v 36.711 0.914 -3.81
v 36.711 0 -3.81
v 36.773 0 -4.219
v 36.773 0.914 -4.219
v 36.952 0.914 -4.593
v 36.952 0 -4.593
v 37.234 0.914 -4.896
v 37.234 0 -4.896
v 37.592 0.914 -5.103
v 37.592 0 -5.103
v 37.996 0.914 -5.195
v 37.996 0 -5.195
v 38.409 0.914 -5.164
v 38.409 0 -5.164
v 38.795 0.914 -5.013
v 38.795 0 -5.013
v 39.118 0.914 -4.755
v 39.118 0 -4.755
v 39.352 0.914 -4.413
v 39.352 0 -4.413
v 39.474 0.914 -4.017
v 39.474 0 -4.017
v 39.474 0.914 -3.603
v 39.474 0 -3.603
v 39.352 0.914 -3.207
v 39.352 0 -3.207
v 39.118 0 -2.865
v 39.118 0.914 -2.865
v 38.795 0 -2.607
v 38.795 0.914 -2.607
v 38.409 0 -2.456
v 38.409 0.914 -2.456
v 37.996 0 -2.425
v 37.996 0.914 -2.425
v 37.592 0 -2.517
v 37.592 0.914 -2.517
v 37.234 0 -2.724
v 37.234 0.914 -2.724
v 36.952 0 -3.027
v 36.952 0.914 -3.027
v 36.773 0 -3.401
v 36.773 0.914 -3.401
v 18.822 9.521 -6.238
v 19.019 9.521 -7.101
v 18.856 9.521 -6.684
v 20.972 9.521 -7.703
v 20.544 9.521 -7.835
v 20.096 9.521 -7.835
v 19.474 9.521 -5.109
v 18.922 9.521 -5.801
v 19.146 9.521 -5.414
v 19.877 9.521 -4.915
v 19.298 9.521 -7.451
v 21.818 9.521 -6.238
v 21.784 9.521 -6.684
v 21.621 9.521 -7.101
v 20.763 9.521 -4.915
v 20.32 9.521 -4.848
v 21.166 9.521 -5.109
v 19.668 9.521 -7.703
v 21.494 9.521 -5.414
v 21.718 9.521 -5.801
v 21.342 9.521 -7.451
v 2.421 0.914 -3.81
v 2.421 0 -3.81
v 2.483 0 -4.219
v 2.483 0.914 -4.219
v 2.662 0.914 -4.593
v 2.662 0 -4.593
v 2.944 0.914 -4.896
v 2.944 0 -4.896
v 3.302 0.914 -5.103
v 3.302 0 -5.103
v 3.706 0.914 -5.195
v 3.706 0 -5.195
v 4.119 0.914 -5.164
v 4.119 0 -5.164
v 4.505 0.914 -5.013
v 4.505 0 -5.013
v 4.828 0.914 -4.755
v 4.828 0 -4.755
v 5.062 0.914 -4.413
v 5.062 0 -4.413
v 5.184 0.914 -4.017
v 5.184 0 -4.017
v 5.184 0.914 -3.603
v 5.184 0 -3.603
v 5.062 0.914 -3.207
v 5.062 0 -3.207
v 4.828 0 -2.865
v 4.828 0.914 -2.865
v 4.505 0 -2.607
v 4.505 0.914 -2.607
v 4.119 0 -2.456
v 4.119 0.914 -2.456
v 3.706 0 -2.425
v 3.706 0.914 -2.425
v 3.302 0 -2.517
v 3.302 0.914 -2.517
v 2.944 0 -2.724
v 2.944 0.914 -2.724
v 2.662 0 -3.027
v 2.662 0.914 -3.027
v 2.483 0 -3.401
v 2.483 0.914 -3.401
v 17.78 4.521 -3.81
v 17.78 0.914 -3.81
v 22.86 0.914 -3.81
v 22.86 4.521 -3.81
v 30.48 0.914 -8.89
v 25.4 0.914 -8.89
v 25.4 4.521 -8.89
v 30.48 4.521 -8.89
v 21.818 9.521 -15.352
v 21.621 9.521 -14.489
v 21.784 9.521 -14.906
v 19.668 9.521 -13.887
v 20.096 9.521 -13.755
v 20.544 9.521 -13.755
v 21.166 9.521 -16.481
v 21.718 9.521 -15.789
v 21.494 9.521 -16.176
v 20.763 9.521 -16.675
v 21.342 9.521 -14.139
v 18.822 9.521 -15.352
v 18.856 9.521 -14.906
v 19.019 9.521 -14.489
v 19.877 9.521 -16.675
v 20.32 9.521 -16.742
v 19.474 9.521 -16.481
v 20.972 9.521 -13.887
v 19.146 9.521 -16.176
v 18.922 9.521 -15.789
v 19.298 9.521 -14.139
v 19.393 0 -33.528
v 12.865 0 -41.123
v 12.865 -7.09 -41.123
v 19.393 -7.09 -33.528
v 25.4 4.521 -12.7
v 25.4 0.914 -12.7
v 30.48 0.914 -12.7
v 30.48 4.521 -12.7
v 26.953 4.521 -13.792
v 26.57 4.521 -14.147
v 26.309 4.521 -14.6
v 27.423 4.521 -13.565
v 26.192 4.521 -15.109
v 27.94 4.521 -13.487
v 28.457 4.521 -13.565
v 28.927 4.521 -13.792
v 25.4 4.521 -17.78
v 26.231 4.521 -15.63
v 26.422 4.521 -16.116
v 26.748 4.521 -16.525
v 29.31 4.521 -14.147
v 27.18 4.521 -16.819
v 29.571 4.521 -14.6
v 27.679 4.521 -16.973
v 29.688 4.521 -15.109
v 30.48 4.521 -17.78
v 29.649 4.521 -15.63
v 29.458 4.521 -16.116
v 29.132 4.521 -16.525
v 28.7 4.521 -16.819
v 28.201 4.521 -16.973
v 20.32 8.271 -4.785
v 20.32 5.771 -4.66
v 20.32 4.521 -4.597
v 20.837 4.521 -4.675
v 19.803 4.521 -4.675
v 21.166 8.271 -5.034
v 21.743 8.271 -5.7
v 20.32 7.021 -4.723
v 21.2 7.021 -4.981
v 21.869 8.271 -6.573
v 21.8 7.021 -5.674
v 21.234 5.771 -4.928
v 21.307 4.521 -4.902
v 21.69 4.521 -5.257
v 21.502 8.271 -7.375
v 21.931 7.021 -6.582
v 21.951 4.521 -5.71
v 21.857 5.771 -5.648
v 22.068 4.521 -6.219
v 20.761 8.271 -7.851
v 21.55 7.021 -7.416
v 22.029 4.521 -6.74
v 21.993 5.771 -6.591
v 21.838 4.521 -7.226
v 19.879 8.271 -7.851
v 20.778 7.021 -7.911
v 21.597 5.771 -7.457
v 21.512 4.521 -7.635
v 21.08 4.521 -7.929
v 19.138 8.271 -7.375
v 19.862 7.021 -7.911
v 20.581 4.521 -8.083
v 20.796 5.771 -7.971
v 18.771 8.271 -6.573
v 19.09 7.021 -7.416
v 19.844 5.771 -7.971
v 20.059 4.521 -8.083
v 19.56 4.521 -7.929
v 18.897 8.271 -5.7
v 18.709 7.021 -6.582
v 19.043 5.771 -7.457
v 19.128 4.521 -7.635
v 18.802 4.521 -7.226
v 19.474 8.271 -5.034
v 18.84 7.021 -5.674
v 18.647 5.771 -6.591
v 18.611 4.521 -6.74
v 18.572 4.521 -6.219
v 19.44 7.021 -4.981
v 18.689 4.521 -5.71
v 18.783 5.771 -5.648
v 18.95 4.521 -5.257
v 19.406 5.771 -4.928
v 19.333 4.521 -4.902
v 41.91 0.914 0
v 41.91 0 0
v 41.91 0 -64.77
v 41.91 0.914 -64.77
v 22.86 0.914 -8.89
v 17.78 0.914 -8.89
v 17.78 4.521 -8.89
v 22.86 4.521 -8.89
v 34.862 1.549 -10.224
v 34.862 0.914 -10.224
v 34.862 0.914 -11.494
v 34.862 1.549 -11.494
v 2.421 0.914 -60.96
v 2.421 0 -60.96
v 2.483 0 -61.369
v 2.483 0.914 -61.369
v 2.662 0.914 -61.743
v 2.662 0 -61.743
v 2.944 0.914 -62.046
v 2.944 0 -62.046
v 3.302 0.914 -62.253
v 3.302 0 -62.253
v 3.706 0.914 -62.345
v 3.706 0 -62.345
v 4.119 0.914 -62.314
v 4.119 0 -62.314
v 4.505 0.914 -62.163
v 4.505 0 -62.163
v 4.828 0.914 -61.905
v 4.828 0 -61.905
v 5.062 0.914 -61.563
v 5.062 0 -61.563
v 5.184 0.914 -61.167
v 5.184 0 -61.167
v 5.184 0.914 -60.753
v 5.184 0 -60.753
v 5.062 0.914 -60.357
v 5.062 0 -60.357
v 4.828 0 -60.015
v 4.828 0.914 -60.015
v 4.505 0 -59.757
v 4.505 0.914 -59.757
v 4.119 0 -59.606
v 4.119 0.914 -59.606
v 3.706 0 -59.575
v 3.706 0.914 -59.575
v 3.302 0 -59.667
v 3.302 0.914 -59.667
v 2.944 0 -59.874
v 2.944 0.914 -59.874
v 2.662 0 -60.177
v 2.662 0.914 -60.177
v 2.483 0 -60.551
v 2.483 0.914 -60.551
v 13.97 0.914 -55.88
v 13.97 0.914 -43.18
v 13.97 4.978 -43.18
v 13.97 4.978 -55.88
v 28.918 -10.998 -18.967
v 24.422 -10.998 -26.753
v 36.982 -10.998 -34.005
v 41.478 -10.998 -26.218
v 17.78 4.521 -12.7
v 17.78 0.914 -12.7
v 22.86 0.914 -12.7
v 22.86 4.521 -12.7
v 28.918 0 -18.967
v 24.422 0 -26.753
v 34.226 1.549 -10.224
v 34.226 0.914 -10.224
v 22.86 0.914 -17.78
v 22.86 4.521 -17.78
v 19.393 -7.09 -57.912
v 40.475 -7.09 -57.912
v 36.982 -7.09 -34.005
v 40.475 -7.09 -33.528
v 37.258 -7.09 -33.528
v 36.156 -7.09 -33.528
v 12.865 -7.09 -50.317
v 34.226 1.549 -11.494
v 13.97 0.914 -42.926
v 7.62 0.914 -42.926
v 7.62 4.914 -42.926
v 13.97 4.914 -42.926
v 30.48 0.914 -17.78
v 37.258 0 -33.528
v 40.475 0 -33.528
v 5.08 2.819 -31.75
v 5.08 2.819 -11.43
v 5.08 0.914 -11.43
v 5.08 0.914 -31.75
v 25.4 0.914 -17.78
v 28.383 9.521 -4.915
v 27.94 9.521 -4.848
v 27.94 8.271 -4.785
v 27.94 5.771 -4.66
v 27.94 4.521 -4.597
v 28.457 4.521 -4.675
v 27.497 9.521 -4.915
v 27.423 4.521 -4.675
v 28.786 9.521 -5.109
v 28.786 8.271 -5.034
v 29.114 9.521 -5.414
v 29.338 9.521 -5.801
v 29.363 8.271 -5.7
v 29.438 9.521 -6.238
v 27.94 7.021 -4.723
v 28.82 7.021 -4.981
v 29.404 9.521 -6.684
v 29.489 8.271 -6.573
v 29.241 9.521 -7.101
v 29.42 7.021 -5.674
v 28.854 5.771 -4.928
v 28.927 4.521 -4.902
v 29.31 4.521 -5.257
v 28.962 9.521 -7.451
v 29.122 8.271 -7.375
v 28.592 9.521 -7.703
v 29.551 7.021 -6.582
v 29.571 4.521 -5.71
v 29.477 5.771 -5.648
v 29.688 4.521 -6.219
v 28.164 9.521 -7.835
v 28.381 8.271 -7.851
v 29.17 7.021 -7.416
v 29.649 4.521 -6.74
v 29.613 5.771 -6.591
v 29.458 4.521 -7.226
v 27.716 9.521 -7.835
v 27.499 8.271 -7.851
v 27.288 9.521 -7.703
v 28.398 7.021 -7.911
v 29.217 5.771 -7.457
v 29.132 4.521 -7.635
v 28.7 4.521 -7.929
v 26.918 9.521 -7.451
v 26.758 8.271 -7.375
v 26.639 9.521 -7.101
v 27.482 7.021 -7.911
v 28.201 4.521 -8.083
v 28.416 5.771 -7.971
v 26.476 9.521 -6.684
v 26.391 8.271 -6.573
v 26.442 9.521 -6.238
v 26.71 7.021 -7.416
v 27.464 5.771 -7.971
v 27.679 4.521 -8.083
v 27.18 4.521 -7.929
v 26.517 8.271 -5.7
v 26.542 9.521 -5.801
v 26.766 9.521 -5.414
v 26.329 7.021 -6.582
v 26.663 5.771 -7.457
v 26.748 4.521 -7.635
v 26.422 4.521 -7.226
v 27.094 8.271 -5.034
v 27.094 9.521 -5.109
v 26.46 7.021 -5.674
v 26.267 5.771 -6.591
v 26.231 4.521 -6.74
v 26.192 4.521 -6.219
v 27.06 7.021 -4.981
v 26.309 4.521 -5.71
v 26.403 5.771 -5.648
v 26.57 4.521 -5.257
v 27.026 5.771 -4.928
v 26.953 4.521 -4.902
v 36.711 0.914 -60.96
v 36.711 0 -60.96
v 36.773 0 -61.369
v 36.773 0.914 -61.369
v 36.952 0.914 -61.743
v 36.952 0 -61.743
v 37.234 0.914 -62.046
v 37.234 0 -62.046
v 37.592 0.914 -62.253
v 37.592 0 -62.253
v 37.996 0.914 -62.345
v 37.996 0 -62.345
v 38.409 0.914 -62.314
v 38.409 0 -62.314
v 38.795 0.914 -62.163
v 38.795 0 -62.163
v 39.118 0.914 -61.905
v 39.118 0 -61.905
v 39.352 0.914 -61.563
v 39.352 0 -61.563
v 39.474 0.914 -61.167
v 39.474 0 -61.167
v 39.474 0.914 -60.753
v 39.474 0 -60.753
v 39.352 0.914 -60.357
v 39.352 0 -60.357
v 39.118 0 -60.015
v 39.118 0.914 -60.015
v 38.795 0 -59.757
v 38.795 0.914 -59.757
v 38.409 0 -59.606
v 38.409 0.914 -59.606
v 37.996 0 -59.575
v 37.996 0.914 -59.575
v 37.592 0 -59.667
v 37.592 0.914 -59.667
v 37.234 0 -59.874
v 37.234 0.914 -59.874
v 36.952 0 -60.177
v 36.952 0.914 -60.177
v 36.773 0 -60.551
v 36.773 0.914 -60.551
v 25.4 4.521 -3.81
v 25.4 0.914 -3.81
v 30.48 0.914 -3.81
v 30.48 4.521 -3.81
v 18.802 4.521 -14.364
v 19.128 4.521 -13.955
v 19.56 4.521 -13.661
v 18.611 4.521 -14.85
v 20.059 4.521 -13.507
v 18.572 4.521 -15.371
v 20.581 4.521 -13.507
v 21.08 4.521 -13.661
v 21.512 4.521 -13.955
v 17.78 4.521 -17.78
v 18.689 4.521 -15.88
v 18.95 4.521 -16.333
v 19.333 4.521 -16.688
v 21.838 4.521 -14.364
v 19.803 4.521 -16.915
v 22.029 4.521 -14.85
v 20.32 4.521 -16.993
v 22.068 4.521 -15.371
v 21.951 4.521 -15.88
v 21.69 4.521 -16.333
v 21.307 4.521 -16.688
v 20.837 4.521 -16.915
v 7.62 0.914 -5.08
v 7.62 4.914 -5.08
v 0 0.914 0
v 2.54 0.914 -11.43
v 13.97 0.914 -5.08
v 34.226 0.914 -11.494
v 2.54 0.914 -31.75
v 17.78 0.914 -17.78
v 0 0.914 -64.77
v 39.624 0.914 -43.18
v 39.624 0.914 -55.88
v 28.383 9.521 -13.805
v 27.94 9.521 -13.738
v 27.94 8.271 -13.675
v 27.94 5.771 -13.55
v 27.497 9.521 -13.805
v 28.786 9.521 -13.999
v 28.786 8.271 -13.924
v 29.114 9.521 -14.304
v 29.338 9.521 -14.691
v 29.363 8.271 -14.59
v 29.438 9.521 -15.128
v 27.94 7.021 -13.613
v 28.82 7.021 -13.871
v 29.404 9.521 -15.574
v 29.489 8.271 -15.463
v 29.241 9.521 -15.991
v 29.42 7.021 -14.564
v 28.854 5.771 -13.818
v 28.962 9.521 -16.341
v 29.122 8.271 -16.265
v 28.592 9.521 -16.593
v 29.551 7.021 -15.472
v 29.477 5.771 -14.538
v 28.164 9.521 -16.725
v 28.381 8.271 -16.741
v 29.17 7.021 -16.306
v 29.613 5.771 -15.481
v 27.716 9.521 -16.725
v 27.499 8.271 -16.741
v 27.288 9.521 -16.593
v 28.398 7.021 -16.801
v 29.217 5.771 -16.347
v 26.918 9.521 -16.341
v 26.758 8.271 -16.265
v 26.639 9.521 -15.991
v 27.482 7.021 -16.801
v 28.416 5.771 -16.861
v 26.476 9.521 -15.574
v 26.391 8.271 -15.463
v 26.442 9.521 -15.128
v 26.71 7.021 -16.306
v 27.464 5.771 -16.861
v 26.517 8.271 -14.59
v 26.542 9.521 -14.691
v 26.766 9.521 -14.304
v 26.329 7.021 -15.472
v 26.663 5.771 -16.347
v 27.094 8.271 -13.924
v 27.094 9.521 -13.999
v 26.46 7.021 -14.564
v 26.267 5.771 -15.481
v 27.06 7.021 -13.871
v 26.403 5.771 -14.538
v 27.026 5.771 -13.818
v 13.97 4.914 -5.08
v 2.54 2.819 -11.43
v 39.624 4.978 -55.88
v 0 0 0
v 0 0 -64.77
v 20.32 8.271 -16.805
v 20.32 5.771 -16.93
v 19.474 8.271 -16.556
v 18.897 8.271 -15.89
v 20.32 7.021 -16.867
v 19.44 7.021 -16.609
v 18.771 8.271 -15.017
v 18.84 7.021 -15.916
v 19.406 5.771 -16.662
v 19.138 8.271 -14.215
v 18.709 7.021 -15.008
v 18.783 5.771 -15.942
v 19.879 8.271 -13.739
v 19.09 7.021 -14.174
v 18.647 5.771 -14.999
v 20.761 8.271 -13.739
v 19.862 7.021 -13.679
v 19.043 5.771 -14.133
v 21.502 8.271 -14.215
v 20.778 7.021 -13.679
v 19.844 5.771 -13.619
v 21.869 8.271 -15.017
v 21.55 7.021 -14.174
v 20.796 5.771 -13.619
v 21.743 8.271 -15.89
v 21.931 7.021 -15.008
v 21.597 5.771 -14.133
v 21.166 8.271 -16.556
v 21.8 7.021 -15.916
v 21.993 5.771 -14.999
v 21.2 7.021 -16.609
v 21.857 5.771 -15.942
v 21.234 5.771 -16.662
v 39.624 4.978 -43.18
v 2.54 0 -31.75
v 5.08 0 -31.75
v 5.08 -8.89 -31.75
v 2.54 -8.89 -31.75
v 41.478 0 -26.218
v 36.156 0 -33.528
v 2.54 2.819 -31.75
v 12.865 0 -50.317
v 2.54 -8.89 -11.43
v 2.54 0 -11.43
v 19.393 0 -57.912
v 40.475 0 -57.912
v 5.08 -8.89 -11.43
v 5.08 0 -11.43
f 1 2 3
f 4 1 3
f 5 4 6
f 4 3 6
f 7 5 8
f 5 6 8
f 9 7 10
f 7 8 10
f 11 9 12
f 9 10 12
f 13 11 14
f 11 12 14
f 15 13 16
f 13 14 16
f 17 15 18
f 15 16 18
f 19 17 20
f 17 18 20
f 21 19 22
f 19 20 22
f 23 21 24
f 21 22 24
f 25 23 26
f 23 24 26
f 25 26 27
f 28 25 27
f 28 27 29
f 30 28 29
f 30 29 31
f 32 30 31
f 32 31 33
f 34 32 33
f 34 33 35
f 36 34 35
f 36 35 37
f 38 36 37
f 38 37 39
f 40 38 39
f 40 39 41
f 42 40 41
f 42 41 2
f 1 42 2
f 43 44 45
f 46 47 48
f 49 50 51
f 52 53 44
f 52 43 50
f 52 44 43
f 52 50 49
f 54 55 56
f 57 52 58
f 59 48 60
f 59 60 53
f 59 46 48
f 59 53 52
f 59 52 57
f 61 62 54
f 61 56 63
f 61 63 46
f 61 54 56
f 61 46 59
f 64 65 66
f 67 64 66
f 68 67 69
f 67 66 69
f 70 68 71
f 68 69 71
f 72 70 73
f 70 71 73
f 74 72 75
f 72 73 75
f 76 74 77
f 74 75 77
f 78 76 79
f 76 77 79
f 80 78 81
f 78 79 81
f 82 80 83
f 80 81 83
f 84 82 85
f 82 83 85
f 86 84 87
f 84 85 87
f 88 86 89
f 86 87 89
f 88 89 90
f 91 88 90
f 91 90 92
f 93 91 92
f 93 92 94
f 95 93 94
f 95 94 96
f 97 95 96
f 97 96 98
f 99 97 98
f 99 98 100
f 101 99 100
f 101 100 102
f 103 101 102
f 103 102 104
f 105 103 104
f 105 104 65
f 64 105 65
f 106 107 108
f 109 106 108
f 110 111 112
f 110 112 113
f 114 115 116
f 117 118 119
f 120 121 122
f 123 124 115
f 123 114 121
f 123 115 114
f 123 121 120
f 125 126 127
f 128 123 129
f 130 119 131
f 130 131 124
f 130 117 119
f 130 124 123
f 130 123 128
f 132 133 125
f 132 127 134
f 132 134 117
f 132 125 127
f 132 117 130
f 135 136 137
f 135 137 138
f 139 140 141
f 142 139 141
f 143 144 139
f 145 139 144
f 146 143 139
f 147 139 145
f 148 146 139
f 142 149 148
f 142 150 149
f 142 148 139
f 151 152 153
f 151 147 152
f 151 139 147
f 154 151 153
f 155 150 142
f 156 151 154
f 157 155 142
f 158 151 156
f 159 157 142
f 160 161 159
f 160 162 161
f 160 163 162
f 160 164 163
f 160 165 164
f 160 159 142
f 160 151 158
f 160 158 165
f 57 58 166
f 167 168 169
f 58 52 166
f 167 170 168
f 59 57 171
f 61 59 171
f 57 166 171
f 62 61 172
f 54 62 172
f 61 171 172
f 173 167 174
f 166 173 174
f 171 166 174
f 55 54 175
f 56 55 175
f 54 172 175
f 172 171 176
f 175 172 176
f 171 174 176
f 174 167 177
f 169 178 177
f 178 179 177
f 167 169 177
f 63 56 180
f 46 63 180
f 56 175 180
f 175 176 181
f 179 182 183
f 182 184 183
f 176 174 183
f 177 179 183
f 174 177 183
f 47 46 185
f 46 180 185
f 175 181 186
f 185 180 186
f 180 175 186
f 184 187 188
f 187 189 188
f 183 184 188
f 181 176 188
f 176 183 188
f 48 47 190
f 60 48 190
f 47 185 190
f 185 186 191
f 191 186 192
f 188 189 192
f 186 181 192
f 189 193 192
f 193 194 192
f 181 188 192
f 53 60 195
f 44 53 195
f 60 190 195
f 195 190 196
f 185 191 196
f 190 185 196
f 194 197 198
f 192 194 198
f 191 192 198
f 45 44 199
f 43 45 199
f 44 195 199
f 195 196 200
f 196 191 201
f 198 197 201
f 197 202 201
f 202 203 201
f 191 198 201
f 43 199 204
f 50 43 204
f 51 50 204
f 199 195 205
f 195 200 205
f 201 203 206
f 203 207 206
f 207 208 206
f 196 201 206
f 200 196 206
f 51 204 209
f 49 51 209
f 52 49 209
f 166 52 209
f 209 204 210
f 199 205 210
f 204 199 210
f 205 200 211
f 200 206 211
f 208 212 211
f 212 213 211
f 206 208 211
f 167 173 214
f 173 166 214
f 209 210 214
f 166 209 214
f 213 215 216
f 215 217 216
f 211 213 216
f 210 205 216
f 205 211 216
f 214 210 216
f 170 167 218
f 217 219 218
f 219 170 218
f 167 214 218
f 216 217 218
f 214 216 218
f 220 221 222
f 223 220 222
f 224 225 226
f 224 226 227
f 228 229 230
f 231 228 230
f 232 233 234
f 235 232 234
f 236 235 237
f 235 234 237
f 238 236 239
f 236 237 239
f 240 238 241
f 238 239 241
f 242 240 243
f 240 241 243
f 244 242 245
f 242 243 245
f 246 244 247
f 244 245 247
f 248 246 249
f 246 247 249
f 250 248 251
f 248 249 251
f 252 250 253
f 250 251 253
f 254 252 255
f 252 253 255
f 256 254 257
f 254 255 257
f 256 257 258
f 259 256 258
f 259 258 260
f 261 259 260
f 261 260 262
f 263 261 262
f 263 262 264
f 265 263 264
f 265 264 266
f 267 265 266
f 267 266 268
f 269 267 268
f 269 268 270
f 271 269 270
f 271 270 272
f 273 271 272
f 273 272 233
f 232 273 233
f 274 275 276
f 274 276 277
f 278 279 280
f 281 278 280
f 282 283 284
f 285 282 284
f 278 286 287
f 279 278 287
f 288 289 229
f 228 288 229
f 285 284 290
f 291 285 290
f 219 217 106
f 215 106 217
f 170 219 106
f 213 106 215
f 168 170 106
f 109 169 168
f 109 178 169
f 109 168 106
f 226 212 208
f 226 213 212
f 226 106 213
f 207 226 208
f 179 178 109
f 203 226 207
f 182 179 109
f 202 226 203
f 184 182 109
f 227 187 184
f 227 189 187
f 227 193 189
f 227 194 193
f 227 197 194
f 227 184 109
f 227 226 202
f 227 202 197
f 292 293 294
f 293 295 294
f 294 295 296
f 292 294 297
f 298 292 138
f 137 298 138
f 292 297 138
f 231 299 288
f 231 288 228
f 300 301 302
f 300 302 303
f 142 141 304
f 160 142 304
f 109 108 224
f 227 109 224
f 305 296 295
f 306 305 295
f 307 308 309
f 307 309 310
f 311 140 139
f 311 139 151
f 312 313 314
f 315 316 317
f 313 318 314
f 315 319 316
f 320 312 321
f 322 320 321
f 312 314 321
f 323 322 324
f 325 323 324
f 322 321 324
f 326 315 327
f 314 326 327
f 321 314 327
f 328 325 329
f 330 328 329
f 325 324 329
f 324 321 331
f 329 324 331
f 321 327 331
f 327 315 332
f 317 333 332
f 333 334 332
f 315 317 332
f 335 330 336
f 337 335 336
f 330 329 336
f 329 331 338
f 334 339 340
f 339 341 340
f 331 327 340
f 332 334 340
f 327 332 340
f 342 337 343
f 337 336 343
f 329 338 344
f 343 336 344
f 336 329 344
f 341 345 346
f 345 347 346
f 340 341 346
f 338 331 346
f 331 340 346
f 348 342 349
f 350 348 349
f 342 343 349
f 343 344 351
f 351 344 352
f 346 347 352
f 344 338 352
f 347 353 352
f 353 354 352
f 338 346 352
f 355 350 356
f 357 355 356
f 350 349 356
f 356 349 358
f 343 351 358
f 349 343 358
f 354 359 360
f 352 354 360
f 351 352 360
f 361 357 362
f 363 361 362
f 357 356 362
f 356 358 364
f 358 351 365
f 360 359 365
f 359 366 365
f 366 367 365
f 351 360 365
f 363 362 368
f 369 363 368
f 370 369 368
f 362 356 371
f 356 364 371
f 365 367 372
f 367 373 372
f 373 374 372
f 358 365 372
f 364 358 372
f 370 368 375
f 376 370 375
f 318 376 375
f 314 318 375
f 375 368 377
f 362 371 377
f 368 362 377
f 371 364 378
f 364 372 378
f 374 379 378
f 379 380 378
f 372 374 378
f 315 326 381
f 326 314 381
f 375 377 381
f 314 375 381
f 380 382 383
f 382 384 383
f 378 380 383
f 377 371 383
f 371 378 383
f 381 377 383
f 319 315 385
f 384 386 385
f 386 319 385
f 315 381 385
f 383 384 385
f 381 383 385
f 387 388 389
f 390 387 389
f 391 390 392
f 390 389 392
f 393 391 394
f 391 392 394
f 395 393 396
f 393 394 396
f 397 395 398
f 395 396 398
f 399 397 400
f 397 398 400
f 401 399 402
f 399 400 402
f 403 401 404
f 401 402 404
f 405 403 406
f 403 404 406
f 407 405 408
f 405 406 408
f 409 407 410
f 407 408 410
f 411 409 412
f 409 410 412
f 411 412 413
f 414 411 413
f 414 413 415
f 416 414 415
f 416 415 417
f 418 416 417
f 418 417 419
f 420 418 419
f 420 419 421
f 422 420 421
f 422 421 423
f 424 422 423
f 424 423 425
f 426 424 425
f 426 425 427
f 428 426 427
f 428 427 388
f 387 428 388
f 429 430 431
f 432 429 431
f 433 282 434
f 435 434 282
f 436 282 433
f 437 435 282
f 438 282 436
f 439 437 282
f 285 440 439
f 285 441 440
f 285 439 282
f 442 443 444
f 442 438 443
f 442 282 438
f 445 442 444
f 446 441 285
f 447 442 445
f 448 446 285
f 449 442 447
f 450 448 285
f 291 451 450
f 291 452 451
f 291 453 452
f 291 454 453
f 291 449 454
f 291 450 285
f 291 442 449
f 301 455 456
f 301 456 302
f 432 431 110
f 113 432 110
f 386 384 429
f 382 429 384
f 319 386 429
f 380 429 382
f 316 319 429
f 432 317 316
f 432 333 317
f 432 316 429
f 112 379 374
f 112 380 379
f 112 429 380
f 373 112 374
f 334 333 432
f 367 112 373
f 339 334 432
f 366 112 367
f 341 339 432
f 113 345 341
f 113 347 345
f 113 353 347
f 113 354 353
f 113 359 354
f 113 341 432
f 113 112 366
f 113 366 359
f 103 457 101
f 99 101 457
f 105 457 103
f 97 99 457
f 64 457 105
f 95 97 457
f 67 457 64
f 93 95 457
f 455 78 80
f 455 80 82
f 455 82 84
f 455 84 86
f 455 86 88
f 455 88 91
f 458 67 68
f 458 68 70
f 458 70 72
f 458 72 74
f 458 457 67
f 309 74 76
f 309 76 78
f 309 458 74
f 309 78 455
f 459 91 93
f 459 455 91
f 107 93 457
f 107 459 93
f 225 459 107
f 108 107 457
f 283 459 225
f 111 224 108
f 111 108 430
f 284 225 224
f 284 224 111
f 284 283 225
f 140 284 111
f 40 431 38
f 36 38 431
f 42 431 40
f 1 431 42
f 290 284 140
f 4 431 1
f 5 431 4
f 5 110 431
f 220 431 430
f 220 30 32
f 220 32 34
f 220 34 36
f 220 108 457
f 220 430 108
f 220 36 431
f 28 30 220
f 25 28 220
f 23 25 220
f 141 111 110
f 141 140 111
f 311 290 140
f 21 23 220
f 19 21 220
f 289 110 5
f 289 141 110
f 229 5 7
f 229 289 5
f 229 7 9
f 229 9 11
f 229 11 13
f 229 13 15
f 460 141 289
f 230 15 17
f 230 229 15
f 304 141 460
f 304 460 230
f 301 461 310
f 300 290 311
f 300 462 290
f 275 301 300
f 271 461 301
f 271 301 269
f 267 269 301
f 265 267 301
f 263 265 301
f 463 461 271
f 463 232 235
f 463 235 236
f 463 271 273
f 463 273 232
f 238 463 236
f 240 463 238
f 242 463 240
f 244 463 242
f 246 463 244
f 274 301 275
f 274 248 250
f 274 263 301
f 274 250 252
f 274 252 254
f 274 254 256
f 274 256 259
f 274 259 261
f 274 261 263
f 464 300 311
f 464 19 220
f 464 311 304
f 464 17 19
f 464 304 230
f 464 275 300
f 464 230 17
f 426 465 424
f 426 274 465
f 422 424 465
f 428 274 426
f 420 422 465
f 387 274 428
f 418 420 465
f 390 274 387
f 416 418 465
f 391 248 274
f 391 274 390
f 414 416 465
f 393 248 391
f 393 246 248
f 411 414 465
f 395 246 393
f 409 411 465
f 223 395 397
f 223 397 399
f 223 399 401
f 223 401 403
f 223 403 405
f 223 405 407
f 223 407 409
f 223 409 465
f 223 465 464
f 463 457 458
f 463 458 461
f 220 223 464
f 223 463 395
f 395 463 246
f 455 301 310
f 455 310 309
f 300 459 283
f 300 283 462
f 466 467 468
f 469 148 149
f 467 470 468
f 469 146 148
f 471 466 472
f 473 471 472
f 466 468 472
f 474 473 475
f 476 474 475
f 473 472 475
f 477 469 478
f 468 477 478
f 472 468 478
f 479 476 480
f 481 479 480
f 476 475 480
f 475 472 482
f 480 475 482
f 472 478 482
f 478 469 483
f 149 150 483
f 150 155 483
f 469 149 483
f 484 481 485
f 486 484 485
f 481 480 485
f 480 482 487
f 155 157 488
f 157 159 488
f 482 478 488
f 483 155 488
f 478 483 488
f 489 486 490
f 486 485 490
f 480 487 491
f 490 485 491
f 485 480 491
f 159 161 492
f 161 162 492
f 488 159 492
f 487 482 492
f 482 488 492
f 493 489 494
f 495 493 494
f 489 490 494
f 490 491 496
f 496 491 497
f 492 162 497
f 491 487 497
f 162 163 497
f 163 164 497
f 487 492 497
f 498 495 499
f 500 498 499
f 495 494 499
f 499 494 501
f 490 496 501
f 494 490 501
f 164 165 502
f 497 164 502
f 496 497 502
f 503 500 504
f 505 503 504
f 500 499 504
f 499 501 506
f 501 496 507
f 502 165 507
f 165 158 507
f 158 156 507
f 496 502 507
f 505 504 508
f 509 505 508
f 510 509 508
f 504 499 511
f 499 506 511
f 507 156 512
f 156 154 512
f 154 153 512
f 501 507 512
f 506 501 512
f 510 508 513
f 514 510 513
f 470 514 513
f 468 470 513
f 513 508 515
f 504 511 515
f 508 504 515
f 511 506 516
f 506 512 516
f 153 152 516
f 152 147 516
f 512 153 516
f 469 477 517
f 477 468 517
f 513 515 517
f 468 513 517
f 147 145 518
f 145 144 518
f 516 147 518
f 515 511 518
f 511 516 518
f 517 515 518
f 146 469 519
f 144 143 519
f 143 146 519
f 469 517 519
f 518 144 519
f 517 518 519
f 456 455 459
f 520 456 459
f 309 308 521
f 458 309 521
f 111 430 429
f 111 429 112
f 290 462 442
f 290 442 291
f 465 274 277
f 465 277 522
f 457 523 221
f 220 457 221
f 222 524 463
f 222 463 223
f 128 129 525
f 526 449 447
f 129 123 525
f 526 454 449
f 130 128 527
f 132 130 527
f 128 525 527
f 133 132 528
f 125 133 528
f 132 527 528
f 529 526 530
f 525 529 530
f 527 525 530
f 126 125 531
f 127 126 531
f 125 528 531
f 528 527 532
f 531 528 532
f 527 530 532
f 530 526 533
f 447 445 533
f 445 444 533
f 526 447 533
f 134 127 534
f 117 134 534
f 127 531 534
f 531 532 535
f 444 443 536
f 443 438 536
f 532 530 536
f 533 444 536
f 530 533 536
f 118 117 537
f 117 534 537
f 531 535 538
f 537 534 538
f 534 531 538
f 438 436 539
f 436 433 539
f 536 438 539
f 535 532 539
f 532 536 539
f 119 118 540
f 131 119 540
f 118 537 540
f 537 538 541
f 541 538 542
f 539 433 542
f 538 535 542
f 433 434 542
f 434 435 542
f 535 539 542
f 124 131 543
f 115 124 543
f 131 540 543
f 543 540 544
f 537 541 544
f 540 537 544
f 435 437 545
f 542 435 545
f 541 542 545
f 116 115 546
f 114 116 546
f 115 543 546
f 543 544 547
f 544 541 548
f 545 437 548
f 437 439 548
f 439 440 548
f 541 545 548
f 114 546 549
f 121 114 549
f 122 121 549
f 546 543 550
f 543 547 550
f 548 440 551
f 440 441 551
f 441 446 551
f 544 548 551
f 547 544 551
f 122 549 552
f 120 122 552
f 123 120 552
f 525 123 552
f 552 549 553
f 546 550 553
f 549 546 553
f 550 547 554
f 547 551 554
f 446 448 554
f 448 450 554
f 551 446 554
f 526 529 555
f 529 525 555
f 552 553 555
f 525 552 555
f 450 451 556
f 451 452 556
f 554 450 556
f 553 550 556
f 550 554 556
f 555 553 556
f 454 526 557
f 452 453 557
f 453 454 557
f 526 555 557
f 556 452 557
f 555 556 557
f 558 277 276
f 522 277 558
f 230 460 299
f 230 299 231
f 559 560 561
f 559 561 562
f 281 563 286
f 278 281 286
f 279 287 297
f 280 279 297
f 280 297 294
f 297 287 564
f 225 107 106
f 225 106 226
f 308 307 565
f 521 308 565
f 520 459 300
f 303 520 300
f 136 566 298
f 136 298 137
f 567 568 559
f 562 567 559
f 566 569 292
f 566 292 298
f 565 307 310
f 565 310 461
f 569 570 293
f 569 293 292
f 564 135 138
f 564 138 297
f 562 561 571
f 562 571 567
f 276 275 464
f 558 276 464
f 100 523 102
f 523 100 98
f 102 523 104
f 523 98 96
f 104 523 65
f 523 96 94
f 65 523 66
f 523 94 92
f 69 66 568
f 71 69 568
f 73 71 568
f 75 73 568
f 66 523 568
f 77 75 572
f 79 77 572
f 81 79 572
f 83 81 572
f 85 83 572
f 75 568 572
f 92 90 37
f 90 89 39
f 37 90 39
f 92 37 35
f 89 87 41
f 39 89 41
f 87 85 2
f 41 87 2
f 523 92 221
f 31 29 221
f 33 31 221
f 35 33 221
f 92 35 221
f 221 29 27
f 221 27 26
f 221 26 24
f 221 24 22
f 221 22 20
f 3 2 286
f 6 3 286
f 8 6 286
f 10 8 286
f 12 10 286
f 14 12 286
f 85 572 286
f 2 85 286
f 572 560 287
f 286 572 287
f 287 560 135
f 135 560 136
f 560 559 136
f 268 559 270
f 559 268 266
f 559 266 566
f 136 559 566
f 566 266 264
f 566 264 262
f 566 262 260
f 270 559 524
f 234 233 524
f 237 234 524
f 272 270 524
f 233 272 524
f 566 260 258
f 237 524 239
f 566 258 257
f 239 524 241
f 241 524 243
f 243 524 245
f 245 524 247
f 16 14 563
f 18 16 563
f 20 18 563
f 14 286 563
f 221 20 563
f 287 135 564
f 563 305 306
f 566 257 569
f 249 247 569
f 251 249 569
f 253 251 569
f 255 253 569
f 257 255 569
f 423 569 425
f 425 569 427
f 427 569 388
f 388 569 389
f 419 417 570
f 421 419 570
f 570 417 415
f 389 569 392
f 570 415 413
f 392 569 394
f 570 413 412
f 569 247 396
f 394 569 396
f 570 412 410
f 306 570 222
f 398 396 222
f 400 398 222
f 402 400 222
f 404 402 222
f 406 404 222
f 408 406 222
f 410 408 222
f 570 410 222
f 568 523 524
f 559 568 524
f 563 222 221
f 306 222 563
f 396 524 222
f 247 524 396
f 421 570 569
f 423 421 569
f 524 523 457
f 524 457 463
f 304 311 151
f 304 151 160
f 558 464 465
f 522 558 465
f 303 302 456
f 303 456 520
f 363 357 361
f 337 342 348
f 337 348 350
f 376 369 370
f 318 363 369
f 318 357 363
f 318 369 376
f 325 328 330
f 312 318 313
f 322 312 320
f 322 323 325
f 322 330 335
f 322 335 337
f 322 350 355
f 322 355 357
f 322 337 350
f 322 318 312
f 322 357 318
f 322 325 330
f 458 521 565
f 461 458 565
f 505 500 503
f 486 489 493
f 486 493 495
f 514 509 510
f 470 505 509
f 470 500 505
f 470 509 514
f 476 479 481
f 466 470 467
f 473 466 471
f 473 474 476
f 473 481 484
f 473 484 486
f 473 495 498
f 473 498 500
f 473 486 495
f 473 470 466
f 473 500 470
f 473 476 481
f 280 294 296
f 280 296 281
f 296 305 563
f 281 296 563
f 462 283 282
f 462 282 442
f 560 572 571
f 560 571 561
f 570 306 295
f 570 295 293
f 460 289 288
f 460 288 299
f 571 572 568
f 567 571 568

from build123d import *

# Parameters (mm, degrees)
SKETCH1_W                           = 41.91
SKETCH1_H                           = 64.77
BOARD_DEPTH                         = 0.9144
BUTTONBASE_W                        = 5.08
BUTTONBASE_H                        = 5.08
BUTTON_DEPTH                        = 3.6068
SKETCH4_W                           = 25.654
SKETCH4_H                           = 12.7
LIPO_DEPTH                          = 4.064
F_7_64_0_10938_DIAMETER_HOLE1_D     = 2.778252
F_7_64_0_10938_DIAMETER_HOLE1_DEPTH = 25.4
F_7_64_0_10938_DIAMETER_HOLE1_TIP   = 0.834671108
SKETCH8_W                           = 0.635
SKETCH8_H                           = 1.27
LED_DEPTH                           = 0.635
POWERJACK_DEPTH                     = 10.9982
XBEE_DEPTH                          = 7.09
SKETCH12_R                          = 1.7526
BUTTONPLUNGER_DEPTH                 = 5
PLUNGER_TAPER_ANGLE                 = 2.87
SKETCH13_W                          = 6.35
SKETCH13_H                          = 37.846
ATMEL_DEPTH                         = 4
HEADERS_DEPTH                       = 8.89
HEADERS_DEPTH_BACK                  = 2.8194
SKETCH15_W                          = 2.54
SKETCH15_H                          = 20.32


with BuildPart() as part:
    # Sketch1 → Board (new body)
    with BuildSketch(Plane(origin=(0, 0, 0), x_dir=(1, 0, 0), z_dir=(0, 1, 0))):
        with Locations((20.955, 32.385)):
            Rectangle(SKETCH1_W, SKETCH1_H)
    extrude(amount=BOARD_DEPTH)

    # ButtonBase → Button (add)
    with BuildSketch(Plane(origin=(0, 0.9144, 0), x_dir=(1, 0, 0), z_dir=(0, 1, 0))):
        with Locations((20.32, 15.24)):
            Rectangle(BUTTONBASE_W, BUTTONBASE_H)
        with Locations((27.94, 15.24)):
            Rectangle(BUTTONBASE_W, BUTTONBASE_H)
        with Locations((27.94, 6.35)):
            Rectangle(BUTTONBASE_W, BUTTONBASE_H)
        with Locations((20.32, 6.35)):
            Rectangle(BUTTONBASE_W, BUTTONBASE_H)
    extrude(amount=BUTTON_DEPTH)

    # Sketch4 → LiPo (add)
    with BuildSketch(Plane(origin=(0, 0.9144, 0), x_dir=(1, 0, 0), z_dir=(0, 1, 0))):
        with Locations((26.797, 49.53)):
            Rectangle(SKETCH4_W, SKETCH4_H)
    extrude(amount=LIPO_DEPTH)

    # 7/64 (0.10938) Diameter Hole1
    with Locations(Plane(origin=(0, 0.9144, 0), x_dir=(1, 0, 0), z_dir=(0, 1, 0))):
        with Locations((3.81, 60.96), (38.1, 60.96), (38.1, 3.81), (3.81, 3.81)):
            Hole(F_7_64_0_10938_DIAMETER_HOLE1_D / 2, depth=F_7_64_0_10938_DIAMETER_HOLE1_DEPTH)
            with Locations((0, 0, -(F_7_64_0_10938_DIAMETER_HOLE1_DEPTH + F_7_64_0_10938_DIAMETER_HOLE1_TIP / 2))):  # 118° drill point
                Cone(0, F_7_64_0_10938_DIAMETER_HOLE1_D / 2, F_7_64_0_10938_DIAMETER_HOLE1_TIP, mode=Mode.SUBTRACT)

    # Sketch8 → LED (add)
    with BuildSketch(Plane(origin=(0, 0.9144, 0), x_dir=(1, 0, 0), z_dir=(0, 1, 0))):
        with Locations((34.544, 10.8585)):
            Rectangle(SKETCH8_W, SKETCH8_H)
    extrude(amount=LED_DEPTH)

    # Sketch10 → PowerJack (add)
    with BuildSketch(Plane.XZ):
        Polygon((41.478212841, -26.21822299), (28.9179, -18.96652299), (24.4221, -26.75347701), (36.982412841, -34.00517701), align=None)
    extrude(amount=POWERJACK_DEPTH)

    # Sketch11 → XBee (add)
    with BuildSketch(Plane.XZ):
        Polygon((19.3929, -57.912), (12.8651, -50.3174), (12.8651, -41.1226), (19.3929, -33.528), (40.4749, -33.528), (40.4749, -57.912), align=None)
    extrude(amount=XBEE_DEPTH)

    # Sketch12 → ButtonPlunger (add)
    with BuildSketch(Plane(origin=(0, 4.5212, 0), x_dir=(1, 0, 0), z_dir=(0, 1, 0))):
        with Locations(Location((20.32, 15.24, 0), (0, 0, 90))):
            Circle(SKETCH12_R)
        with Locations(Location((27.94, 15.24, 0), (0, 0, 270))):
            Circle(SKETCH12_R)
        with Locations(Location((27.94, 6.35, 0), (0, 0, 270))):
            Circle(SKETCH12_R)
        with Locations(Location((20.32, 6.35, 0), (0, 0, 270))):
            Circle(SKETCH12_R)
    extrude(amount=BUTTONPLUNGER_DEPTH)

    # Plunger Taper
    plunger_taper_faces = [part.faces().sort_by_distance(p)[0] for p in [
        (27.94, 7.0212, -8.1026),
        (27.94, 7.0212, -16.9926),
        (20.32, 7.0212, -13.4874),
        (20.32, 7.0212, -8.1026),
    ]]
    draft(plunger_taper_faces, Plane.ZX.offset(4.5212), PLUNGER_TAPER_ANGLE)

    # Sketch13 → ATMEL (add)
    with BuildSketch(Plane(origin=(0, 0.9144, 0), x_dir=(1, 0, 0), z_dir=(0, 1, 0))):
        with Locations((10.795, 24.003)):
            Rectangle(SKETCH13_W, SKETCH13_H)
    extrude(amount=ATMEL_DEPTH)

    # Sketch15 → Headers (add, two sides: drawn at the far end of the back side and taken through both)
    with BuildSketch(Plane(origin=(0, 0, 0), x_dir=(-1, 0, 0), z_dir=(0, -1, 0)).offset(-HEADERS_DEPTH_BACK)):
        with Locations((-3.81, 21.59)):
            Rectangle(SKETCH15_W, SKETCH15_H)
    extrude(amount=HEADERS_DEPTH + HEADERS_DEPTH_BACK)


solid = part.part
